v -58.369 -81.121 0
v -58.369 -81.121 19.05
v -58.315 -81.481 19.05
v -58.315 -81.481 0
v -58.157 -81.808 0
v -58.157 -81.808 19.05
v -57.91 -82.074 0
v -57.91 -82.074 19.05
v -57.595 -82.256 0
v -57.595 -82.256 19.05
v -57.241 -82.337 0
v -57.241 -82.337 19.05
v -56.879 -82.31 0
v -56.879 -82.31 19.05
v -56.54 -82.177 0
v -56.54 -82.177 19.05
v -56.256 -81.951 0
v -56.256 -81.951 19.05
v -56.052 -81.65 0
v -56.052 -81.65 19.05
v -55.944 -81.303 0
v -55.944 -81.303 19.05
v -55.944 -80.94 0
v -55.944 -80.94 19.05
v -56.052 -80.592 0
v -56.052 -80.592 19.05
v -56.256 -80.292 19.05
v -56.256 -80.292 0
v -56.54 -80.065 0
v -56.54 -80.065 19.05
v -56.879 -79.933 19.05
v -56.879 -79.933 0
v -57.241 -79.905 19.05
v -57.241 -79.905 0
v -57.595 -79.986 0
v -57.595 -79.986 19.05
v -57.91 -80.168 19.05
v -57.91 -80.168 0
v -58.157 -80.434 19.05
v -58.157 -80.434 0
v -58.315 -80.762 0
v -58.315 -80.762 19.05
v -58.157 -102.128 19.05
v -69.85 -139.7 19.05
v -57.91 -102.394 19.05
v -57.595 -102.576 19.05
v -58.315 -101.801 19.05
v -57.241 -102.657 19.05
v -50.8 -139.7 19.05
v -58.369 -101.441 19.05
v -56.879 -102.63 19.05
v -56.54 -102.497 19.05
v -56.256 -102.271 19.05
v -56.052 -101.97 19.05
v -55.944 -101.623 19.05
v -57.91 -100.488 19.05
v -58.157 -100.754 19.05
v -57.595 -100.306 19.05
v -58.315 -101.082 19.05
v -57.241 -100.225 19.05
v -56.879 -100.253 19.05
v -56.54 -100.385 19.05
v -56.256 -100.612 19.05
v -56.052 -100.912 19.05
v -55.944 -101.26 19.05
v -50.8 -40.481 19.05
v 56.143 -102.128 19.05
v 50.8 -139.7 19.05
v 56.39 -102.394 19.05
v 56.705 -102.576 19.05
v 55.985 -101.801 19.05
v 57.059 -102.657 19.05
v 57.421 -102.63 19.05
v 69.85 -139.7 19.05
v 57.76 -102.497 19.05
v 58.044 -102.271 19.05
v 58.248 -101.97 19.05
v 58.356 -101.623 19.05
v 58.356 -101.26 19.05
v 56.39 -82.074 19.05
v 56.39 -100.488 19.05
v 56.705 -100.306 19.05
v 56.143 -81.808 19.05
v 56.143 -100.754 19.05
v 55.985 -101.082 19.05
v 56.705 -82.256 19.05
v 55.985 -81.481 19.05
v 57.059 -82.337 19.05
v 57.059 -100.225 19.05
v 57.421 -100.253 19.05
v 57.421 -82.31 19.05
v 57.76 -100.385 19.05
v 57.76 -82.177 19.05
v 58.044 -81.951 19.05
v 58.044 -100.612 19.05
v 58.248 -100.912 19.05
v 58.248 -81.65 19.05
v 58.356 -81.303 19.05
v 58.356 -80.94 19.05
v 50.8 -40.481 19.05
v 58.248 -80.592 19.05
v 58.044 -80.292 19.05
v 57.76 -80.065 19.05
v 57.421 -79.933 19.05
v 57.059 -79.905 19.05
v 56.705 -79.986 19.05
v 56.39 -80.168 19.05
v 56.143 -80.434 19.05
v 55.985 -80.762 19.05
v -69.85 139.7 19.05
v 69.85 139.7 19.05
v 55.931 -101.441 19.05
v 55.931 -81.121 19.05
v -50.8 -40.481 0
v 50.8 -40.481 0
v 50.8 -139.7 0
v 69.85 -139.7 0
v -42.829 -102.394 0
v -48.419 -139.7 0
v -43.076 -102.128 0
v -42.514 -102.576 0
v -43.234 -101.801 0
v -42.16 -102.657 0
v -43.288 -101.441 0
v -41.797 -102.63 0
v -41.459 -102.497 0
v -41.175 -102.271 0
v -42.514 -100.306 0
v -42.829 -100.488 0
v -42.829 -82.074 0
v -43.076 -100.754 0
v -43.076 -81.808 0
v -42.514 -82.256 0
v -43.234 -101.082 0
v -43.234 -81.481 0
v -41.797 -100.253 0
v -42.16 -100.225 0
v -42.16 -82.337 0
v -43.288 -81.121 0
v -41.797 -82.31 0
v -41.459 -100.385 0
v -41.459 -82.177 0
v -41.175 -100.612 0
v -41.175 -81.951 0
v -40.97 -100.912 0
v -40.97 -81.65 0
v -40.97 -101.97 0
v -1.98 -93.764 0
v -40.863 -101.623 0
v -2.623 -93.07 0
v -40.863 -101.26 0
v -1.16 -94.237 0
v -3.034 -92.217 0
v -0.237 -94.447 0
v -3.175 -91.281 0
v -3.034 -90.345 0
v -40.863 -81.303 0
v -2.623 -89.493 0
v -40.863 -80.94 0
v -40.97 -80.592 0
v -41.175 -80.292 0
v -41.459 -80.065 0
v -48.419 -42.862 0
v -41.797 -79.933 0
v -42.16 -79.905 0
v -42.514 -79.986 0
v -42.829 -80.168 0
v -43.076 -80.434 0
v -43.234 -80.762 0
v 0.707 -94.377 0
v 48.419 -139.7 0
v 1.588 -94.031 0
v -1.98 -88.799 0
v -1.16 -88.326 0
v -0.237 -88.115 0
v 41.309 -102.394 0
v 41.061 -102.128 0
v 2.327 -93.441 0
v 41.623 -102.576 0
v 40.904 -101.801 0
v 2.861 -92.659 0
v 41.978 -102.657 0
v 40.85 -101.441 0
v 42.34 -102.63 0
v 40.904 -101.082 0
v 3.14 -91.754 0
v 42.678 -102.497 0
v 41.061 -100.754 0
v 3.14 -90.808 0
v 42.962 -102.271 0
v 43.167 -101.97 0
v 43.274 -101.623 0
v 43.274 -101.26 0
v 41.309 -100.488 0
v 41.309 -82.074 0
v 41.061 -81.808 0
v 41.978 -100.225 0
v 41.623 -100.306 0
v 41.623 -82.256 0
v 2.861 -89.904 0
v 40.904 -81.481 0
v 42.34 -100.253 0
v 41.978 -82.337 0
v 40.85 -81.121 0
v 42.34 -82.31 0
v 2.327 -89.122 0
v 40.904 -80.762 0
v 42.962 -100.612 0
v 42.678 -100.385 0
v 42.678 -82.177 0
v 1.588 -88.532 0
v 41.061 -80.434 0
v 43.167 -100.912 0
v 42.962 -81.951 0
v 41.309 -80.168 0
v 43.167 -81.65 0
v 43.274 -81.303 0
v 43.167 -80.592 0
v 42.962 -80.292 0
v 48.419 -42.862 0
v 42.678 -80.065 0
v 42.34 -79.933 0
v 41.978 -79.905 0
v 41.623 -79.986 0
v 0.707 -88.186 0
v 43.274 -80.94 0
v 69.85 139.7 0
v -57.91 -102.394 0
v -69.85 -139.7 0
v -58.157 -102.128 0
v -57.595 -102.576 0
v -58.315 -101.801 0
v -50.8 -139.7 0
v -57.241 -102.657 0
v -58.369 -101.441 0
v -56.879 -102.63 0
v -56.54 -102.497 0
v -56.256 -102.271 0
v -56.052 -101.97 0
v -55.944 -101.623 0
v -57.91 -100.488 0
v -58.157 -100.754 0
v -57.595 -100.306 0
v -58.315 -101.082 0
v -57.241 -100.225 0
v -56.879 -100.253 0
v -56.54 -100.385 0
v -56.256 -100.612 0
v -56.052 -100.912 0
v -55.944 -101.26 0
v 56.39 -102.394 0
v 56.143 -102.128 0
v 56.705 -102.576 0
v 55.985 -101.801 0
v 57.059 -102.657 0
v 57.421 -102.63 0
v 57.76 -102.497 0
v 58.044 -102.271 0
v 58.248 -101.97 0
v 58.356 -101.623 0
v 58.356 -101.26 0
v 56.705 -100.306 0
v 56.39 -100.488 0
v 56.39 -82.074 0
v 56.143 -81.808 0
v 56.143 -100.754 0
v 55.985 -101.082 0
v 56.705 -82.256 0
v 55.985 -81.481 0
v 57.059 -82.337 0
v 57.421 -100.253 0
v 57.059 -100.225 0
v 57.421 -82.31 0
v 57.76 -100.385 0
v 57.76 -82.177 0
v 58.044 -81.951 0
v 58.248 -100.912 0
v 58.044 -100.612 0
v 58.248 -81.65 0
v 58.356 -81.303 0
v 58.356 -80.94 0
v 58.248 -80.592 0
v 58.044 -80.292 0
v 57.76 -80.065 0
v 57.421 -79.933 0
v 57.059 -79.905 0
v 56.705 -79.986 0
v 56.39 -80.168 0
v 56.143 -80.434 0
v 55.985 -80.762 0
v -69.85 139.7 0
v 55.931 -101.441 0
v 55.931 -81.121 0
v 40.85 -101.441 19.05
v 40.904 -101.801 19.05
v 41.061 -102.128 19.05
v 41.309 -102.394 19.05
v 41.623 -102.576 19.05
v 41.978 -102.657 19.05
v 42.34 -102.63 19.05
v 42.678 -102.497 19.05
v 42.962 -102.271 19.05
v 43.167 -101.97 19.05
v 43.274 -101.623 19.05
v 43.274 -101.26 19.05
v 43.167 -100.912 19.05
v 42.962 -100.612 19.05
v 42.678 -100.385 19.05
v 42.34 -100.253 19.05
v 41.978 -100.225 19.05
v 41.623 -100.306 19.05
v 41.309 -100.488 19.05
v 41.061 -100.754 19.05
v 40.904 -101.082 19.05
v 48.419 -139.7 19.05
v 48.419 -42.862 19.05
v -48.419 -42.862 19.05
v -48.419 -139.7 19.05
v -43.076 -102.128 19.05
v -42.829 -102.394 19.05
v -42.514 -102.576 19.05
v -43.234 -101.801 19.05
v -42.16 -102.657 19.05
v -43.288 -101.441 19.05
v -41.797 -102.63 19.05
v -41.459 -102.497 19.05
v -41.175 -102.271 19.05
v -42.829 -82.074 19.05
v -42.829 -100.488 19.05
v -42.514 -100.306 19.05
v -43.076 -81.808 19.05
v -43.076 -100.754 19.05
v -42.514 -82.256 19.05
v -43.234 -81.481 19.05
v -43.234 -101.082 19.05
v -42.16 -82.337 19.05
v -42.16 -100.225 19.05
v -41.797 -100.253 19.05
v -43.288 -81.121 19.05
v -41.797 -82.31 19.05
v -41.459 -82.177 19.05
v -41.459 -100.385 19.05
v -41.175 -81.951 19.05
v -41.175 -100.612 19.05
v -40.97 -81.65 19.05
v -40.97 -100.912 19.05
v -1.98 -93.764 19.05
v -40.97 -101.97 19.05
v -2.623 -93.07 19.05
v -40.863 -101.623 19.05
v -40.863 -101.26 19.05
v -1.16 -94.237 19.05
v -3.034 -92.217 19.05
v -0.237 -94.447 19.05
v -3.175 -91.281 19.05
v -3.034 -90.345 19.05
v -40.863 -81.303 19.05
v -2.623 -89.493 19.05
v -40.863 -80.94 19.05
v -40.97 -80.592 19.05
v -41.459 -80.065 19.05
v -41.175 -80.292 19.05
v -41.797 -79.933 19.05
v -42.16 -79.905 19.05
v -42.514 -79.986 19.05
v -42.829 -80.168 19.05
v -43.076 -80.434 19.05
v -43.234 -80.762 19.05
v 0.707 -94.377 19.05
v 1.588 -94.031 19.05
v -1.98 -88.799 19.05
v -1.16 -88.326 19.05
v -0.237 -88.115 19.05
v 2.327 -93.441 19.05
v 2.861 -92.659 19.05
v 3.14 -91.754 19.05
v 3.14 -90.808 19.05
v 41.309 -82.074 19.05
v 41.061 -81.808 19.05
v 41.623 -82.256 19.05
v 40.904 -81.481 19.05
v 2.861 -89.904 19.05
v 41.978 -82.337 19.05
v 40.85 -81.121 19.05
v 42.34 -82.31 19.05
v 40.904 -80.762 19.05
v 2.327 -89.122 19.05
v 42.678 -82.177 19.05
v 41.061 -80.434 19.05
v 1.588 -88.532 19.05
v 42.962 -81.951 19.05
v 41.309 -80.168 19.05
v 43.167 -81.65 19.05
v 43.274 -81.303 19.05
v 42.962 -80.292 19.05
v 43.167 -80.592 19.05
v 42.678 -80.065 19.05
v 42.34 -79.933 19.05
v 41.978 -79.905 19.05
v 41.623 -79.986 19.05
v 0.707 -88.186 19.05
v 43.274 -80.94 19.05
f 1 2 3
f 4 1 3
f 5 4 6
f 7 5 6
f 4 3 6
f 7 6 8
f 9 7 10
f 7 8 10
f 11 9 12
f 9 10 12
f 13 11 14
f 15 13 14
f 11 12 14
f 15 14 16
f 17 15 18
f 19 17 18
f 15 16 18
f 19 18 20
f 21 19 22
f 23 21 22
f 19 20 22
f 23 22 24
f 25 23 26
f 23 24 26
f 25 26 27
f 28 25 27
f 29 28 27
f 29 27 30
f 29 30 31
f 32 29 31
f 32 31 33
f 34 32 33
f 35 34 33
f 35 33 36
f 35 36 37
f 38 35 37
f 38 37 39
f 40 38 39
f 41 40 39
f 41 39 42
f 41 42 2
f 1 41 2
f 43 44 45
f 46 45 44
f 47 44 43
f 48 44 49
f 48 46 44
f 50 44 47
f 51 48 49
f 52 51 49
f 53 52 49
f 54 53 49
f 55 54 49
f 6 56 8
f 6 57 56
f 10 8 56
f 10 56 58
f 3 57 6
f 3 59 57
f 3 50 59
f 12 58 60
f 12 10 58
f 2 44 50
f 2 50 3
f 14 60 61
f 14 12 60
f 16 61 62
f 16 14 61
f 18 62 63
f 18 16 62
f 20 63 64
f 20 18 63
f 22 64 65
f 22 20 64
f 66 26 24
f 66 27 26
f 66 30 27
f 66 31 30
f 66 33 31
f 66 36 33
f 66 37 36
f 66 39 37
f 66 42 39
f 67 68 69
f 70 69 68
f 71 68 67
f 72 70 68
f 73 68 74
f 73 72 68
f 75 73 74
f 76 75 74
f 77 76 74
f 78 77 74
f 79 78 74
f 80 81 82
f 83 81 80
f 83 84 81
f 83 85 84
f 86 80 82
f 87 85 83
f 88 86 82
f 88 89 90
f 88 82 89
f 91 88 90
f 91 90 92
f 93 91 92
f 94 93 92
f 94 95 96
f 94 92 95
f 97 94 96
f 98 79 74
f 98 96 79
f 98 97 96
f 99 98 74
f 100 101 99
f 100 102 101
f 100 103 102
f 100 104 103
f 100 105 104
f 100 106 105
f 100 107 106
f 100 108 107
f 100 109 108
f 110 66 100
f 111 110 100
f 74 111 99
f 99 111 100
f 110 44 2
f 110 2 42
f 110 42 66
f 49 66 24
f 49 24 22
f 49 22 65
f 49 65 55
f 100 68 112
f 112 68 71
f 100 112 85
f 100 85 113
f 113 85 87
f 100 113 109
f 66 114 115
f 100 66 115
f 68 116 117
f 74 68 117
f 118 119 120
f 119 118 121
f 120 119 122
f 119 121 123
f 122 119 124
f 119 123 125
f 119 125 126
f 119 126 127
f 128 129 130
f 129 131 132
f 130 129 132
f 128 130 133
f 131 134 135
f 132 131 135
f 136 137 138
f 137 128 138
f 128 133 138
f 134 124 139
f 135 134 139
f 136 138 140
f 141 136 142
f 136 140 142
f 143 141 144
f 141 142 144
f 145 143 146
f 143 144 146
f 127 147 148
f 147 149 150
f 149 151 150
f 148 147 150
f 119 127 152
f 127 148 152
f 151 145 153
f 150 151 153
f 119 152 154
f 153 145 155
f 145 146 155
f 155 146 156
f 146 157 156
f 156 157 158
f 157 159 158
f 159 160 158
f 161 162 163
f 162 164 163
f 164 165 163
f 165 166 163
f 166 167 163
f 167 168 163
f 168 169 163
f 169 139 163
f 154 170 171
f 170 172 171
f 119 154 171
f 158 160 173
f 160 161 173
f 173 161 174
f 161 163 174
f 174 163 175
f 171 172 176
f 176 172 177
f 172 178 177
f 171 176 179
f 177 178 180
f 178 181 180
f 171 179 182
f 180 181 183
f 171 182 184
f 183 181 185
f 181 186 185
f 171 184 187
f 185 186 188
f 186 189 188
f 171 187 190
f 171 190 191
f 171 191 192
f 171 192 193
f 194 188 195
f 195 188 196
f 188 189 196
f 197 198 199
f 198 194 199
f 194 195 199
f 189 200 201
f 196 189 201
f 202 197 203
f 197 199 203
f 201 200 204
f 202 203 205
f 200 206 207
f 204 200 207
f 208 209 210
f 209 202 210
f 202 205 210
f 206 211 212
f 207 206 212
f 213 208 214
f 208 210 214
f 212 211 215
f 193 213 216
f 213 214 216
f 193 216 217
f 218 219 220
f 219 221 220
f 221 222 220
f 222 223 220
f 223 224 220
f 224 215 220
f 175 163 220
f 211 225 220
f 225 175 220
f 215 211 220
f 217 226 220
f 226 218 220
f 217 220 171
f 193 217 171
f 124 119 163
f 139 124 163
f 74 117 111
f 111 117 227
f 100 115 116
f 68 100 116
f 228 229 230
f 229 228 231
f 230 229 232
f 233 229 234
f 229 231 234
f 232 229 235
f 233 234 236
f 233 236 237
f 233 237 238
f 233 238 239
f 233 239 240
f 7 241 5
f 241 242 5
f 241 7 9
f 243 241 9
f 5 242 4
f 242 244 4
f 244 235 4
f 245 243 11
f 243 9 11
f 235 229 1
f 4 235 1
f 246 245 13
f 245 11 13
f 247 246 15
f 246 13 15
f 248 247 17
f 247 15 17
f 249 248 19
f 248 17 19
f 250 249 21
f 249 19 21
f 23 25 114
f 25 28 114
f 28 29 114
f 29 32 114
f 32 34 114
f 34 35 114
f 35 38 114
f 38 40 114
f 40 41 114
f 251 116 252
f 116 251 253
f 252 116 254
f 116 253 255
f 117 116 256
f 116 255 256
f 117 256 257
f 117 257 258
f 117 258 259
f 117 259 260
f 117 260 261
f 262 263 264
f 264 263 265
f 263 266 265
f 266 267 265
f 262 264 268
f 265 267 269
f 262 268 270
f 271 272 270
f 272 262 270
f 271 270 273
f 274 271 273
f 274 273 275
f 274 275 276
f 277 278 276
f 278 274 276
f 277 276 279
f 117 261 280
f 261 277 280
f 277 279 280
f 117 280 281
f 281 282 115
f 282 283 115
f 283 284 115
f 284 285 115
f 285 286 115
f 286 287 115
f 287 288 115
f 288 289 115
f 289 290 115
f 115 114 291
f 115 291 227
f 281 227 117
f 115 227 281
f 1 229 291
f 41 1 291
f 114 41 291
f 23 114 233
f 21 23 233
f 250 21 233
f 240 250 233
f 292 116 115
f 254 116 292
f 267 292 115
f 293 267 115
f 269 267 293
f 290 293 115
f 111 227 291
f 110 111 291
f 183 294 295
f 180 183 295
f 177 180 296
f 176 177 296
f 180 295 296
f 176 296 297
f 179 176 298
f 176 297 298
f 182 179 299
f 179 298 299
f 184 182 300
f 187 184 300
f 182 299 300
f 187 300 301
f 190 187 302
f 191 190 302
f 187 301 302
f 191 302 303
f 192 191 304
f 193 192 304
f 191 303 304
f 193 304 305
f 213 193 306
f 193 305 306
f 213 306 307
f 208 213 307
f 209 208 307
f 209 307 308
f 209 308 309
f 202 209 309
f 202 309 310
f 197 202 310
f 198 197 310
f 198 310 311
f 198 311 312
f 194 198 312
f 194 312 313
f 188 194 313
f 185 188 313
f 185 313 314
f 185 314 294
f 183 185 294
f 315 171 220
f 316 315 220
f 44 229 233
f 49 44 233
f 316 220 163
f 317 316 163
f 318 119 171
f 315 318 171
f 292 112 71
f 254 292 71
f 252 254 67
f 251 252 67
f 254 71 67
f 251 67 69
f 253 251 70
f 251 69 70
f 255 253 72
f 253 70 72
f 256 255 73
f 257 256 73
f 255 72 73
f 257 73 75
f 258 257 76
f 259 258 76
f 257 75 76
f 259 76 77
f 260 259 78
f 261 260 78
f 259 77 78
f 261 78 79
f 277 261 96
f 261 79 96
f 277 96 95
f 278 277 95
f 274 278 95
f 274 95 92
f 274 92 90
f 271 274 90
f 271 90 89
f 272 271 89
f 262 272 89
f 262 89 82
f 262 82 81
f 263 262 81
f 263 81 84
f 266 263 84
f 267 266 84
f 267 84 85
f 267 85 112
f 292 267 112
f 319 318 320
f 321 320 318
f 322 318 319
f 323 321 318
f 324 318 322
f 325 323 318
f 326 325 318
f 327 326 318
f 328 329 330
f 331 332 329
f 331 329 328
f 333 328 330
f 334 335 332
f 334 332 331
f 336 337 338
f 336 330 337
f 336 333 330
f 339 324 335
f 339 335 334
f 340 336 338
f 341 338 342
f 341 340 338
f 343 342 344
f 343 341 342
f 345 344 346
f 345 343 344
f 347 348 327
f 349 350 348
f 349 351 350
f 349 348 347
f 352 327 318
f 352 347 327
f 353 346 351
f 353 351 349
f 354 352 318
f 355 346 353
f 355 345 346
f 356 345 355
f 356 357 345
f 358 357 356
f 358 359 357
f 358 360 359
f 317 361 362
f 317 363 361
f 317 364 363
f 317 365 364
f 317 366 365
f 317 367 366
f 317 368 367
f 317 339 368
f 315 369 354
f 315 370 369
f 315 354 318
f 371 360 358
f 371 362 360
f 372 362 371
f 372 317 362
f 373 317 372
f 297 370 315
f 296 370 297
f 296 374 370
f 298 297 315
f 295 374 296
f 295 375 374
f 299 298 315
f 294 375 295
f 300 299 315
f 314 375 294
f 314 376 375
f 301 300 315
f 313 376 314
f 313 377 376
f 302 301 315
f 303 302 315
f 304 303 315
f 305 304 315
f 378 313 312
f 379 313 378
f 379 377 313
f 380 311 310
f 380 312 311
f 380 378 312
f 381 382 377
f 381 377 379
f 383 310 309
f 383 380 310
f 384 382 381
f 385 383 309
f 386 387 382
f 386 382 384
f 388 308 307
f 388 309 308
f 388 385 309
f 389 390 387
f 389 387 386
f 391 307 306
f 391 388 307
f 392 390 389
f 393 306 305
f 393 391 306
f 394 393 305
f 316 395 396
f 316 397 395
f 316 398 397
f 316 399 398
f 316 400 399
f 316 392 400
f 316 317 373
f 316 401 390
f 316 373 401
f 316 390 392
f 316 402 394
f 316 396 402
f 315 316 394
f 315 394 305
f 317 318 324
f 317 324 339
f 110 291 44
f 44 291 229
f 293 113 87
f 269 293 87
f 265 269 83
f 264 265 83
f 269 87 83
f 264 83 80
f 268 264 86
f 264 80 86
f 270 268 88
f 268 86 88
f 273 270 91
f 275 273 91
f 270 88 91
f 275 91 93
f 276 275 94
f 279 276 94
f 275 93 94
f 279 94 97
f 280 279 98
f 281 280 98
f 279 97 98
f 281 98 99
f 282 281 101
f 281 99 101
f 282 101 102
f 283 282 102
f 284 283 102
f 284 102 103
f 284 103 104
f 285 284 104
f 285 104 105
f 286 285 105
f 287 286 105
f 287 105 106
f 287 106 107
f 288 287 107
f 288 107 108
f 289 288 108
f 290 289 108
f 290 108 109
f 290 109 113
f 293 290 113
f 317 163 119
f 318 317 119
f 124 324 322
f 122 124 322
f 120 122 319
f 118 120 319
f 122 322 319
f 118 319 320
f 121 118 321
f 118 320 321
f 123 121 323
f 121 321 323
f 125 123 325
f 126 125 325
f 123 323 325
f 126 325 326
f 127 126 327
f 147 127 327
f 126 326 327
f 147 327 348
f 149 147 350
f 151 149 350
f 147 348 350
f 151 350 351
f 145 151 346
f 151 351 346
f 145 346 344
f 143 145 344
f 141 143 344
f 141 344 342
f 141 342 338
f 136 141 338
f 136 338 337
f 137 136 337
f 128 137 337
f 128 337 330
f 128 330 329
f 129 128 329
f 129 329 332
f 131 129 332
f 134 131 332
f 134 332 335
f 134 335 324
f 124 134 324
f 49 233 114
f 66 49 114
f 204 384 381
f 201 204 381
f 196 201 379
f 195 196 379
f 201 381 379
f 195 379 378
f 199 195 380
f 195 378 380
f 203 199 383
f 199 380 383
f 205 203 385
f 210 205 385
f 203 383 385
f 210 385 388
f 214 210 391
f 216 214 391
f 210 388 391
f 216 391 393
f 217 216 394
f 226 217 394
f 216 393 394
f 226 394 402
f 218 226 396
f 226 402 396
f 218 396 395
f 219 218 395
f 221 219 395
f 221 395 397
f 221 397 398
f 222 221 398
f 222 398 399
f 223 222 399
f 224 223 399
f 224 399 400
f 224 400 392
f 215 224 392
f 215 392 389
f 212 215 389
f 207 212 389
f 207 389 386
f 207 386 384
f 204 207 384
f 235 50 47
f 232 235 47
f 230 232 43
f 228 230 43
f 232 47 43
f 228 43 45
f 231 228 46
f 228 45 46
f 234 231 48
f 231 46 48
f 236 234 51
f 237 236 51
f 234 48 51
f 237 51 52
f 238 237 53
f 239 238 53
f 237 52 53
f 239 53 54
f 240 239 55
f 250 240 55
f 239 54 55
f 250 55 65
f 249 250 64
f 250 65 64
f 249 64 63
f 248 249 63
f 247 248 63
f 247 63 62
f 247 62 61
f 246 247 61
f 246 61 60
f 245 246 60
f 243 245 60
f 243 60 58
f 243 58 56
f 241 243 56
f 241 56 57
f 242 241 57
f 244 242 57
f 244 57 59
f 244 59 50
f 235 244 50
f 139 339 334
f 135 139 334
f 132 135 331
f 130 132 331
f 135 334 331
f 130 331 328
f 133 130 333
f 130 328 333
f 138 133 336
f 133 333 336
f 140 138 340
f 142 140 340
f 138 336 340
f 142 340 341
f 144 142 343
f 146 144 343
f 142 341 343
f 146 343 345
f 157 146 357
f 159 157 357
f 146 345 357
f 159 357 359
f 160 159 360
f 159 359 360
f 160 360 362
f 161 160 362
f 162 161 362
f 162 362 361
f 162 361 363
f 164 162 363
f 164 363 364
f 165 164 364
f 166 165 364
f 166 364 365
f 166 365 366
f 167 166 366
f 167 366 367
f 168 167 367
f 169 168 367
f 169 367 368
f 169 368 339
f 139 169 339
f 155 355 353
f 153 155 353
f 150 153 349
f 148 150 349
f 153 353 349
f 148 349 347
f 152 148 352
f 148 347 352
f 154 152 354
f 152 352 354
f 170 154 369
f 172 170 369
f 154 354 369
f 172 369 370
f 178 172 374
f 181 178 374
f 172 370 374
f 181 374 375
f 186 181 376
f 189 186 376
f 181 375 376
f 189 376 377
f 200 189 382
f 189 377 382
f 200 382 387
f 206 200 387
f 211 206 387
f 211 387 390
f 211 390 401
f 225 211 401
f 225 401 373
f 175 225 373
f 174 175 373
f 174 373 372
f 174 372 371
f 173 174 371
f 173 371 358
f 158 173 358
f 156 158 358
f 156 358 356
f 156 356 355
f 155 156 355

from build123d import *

# Parameters (mm, degrees)
F1_DEPTH = 19.05
F2_D     = 2.4384
F2_2_D   = 2.4384
F3_D     = 6.35


with BuildPart() as f1:
    # F0 (on Top) → F1 (new body)
    with BuildSketch(Plane.XY):
        Polygon((50.8, -139.7), (69.85, -139.7), (69.85, 139.7), (-69.85, 139.7), (-69.85, -139.7), (-50.8, -139.7), (-50.8, -40.48125), (50.8, -40.48125), align=None)
    extrude(amount=F1_DEPTH)

    # F2 (through all)
    with Locations(Plane(origin=(0, 0, 0), x_dir=(1, 0, 0), z_dir=(0, 0, -1))):
        with Locations((-57.15, 81.12125), (-57.15, 101.44125), (-42.06875, 101.44125), (-42.06875, 81.12125), (42.06875, 81.12125), (57.15, 81.12125), (57.15, 101.44125), (42.06875, 101.44125)):
            Hole(F2_D / 2)


with BuildPart() as f1b:
    # F0 (on Top) → F1, piece 2 (new body)
    with BuildSketch(Plane.XY):
        Polygon((48.41875, -42.8625), (-48.41875, -139.7), (48.41875, -139.7), align=None)
        Polygon((-48.41875, -42.8625), (-48.41875, -139.7), (48.41875, -42.8625), align=None)
    extrude(amount=F1_DEPTH)

    # F2#2 (through all)
    with Locations(Plane(origin=(0, 0, 0), x_dir=(1, 0, 0), z_dir=(0, 0, -1))):
        with Locations((-57.15, 81.12125), (-57.15, 101.44125), (-42.06875, 101.44125), (-42.06875, 81.12125), (42.06875, 81.12125), (57.15, 81.12125), (57.15, 101.44125), (42.06875, 101.44125)):
            Hole(F2_2_D / 2)

    # F3 (through all)
    with Locations(Plane(origin=(0, 0, 0), x_dir=(1, 0, 0), z_dir=(0, 0, -1))):
        with Locations((0, 91.28125)):
            Hole(F3_D / 2)


solid = Compound([f1.part, f1b.part])
